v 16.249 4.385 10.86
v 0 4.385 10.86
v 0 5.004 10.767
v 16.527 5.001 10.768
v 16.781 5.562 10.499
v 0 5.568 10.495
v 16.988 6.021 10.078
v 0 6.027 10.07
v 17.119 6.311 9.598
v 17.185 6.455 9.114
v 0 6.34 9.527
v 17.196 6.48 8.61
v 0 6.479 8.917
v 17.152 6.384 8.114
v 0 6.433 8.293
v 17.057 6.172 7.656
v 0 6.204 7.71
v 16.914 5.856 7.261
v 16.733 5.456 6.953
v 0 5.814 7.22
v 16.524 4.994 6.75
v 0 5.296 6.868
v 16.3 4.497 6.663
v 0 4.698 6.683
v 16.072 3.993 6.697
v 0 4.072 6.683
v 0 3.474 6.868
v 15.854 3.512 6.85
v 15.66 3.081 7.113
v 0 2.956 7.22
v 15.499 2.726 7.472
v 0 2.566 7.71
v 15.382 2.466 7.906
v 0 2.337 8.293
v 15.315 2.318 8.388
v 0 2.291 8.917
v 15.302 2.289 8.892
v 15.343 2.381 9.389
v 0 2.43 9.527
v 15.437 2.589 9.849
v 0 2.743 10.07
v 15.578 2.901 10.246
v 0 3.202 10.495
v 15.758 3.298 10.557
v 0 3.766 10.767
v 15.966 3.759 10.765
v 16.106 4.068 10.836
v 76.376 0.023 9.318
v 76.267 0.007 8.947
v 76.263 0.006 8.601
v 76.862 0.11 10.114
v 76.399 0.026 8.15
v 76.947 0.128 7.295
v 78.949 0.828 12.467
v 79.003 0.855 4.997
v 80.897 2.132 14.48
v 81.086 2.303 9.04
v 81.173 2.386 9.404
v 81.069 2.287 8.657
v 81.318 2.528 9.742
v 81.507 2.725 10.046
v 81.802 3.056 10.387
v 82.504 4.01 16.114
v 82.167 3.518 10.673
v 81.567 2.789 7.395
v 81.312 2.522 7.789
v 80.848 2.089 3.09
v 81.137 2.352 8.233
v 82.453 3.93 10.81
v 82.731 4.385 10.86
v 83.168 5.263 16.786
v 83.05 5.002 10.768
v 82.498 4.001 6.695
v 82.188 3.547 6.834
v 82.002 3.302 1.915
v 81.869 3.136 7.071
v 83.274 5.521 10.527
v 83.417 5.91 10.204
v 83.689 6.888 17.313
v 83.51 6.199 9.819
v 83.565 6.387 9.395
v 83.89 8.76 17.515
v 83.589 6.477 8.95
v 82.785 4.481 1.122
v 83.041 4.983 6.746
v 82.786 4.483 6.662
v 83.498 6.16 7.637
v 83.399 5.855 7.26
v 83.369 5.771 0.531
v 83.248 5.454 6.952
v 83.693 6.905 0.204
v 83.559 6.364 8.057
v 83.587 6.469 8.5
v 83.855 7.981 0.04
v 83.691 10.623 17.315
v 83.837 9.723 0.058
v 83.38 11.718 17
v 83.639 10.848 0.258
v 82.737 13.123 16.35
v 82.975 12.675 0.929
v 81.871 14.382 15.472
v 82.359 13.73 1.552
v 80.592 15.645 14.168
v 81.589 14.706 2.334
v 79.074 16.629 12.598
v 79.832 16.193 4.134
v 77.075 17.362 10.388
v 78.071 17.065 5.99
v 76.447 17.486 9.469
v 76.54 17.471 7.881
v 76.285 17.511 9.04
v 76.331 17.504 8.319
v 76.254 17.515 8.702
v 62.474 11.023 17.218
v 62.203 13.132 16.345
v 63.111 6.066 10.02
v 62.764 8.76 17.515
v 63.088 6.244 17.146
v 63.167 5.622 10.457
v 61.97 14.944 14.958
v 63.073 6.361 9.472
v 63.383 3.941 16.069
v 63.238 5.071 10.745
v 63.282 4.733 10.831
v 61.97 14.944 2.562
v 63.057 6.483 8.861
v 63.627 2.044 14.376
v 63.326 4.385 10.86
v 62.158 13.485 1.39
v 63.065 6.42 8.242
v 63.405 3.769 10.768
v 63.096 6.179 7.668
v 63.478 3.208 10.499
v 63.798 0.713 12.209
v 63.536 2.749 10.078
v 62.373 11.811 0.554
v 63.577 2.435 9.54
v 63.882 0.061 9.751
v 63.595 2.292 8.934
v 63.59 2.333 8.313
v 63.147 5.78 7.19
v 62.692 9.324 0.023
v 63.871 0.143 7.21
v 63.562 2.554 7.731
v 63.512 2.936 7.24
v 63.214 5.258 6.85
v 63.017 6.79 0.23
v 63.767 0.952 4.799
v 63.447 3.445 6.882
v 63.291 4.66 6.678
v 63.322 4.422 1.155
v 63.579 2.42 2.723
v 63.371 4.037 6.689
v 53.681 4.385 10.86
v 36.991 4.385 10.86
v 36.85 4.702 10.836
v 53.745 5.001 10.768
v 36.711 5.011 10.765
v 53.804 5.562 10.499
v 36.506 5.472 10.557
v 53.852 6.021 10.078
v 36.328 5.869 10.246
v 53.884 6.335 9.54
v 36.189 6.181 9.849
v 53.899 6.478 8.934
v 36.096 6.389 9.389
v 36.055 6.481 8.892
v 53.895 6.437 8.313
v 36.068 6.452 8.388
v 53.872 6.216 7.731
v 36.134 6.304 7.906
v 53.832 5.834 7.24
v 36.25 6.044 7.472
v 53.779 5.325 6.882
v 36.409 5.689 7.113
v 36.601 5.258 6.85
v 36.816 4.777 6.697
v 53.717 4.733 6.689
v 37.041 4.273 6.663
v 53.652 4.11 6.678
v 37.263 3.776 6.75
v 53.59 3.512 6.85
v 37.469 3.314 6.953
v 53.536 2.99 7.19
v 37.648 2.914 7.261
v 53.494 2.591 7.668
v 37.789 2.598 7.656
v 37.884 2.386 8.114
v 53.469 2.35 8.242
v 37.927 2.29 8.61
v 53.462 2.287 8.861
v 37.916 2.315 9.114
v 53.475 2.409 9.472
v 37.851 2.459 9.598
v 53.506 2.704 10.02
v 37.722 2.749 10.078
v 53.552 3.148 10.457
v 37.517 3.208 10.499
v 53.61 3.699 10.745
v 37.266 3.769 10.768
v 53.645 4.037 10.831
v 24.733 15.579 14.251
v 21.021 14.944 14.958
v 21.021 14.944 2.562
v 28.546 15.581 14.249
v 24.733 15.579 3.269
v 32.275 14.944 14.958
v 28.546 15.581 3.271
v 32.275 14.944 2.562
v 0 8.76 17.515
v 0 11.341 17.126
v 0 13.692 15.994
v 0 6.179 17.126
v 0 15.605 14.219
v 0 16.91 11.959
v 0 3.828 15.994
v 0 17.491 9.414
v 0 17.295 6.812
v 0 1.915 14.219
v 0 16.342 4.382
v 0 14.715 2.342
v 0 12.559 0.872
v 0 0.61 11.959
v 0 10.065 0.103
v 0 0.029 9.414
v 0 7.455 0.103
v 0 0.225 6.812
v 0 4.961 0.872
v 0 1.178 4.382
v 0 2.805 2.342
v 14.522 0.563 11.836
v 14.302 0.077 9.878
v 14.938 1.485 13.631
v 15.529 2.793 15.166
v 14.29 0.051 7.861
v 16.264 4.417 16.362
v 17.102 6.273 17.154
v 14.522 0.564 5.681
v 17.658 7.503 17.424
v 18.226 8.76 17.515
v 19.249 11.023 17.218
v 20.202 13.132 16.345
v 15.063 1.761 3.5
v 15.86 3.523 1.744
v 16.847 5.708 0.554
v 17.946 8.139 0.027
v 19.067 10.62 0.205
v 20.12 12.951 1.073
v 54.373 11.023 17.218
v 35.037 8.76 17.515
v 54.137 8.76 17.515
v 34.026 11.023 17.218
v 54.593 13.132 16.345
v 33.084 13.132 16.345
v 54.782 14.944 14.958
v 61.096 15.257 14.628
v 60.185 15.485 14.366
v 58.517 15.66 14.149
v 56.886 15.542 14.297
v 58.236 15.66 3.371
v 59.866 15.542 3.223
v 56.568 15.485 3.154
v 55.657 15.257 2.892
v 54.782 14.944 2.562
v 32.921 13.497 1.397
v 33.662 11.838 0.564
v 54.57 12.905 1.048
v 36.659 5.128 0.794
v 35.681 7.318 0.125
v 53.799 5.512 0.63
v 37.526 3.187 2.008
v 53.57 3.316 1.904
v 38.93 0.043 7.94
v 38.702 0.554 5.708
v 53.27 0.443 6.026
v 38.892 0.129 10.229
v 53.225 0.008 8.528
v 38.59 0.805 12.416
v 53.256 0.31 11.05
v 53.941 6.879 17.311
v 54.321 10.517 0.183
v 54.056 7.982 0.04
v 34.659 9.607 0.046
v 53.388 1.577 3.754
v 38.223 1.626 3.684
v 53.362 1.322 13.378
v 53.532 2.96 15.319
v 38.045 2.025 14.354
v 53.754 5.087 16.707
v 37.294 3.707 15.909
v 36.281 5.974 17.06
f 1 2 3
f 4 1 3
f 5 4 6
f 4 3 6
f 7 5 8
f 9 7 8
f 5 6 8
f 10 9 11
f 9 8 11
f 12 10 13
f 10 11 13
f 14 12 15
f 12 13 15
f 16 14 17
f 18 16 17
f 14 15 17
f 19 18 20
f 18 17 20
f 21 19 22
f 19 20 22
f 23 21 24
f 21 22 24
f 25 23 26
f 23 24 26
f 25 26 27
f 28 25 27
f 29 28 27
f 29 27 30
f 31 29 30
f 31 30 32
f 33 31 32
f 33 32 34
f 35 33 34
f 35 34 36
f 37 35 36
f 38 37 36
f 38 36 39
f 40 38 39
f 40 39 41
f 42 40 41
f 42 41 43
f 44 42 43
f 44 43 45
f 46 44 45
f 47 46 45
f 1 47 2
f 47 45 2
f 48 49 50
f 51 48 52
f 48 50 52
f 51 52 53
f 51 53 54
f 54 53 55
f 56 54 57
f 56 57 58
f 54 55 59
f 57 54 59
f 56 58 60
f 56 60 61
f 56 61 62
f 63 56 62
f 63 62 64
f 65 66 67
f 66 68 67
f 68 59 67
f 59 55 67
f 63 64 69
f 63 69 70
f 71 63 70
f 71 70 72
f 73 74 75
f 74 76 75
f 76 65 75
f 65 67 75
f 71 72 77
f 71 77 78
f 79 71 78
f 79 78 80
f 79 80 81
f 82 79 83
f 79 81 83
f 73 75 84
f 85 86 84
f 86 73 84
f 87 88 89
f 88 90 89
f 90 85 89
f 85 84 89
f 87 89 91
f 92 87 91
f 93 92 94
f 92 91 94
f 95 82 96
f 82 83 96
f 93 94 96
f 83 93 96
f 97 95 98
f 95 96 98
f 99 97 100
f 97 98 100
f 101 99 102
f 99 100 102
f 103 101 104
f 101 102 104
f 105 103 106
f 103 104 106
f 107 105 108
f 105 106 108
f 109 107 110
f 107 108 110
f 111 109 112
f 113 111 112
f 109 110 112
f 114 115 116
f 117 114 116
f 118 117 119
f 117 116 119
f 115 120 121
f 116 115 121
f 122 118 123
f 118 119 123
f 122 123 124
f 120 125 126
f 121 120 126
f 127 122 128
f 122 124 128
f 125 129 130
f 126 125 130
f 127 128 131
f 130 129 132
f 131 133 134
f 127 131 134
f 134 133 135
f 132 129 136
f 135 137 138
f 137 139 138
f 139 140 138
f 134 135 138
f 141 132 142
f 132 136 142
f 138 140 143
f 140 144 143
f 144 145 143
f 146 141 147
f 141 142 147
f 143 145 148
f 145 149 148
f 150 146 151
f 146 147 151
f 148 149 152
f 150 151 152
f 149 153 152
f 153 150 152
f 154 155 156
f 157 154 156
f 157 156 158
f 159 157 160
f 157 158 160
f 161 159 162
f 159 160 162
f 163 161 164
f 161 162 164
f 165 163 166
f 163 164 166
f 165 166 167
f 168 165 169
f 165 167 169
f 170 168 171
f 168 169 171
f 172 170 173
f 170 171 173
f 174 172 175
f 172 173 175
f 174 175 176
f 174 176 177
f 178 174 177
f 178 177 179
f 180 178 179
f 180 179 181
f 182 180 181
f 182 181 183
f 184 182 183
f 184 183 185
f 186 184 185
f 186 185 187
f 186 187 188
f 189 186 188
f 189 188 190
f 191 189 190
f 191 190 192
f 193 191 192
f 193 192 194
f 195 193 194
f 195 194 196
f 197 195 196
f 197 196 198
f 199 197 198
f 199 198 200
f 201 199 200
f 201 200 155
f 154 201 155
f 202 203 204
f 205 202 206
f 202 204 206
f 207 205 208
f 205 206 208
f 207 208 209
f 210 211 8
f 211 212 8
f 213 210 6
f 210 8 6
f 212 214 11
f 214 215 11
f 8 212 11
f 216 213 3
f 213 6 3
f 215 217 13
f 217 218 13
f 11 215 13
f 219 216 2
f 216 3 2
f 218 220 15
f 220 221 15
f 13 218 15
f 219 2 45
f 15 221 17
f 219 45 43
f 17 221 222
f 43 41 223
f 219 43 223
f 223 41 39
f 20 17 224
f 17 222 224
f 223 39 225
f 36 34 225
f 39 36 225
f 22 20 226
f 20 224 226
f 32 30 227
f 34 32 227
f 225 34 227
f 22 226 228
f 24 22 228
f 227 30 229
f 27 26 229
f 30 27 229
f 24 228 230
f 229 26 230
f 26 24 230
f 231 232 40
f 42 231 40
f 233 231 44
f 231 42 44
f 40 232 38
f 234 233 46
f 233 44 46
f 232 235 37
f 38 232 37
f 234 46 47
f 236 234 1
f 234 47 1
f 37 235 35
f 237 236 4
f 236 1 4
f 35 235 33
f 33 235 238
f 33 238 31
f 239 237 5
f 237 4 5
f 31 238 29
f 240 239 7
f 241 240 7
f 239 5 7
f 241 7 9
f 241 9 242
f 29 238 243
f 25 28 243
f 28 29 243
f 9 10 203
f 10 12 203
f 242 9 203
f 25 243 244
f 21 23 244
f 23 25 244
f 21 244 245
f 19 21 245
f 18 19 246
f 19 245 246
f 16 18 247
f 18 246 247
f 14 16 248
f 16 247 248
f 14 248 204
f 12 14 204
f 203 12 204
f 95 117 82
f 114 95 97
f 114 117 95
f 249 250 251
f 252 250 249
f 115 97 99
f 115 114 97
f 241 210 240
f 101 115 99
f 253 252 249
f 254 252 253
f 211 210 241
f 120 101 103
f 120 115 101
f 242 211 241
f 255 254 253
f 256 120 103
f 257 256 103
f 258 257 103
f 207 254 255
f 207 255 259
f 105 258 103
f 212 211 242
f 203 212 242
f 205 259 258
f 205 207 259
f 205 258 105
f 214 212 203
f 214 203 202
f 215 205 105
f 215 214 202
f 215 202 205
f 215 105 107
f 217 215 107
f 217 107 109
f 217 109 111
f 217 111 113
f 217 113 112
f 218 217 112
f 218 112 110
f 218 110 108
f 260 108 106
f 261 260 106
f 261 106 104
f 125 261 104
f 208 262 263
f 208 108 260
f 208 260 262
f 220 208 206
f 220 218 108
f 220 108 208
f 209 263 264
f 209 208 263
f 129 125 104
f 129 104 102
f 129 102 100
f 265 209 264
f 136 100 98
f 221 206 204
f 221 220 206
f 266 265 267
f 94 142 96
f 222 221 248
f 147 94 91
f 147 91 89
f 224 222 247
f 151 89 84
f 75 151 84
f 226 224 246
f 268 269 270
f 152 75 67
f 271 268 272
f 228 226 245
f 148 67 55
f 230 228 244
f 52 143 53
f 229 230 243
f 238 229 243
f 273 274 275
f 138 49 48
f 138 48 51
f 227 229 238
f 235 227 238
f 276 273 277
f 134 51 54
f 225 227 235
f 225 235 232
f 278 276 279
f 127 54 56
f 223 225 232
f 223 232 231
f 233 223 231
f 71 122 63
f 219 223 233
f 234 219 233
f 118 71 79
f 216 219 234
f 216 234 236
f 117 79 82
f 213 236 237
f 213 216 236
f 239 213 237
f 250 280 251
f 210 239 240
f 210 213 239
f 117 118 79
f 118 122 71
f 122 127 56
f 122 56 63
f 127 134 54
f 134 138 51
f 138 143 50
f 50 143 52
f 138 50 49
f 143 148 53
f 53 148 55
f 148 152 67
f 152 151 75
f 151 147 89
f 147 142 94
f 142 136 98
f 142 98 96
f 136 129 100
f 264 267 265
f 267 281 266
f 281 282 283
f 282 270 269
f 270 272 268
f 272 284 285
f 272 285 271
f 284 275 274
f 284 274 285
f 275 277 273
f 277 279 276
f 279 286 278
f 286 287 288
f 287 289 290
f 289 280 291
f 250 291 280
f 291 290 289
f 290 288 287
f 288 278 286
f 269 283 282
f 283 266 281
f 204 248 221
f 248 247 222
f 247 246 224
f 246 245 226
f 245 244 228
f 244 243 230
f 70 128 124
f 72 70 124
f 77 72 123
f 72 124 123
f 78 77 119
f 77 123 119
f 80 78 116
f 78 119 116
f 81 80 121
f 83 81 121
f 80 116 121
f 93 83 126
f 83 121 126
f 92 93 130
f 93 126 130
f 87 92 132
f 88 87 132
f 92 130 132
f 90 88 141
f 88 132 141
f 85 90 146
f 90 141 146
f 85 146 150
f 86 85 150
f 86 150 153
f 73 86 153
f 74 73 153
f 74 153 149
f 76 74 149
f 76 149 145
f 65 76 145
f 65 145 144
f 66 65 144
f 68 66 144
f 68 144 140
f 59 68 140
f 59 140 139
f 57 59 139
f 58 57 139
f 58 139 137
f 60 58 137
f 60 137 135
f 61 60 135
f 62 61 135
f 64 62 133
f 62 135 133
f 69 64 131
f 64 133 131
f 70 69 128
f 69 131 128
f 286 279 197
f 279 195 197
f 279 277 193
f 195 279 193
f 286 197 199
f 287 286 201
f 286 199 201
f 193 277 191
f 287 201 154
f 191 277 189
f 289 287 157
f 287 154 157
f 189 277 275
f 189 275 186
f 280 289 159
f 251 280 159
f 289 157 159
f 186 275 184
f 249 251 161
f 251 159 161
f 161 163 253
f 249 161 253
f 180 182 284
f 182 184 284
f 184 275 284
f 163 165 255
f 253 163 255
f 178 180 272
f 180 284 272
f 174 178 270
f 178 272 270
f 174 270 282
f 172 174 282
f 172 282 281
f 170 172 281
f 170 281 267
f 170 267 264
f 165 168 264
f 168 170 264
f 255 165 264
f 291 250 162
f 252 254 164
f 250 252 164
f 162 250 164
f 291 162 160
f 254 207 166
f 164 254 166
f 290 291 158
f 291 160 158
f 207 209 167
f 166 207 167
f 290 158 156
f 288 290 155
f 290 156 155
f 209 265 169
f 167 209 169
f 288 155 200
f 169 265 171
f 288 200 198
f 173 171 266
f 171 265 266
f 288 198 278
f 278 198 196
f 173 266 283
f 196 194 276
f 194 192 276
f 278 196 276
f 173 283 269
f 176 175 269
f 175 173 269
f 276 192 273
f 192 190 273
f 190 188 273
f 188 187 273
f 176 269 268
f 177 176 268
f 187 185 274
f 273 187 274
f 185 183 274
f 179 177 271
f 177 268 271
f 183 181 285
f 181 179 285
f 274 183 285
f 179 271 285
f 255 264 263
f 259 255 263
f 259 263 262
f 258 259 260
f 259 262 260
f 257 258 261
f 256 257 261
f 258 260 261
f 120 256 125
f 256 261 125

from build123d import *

# Parameters (mm, degrees)
BOSS_EXTRUDE3_DEPTH = 17.52
SKETCH5_OUTSIDE_W   = 37.02
SKETCH5_OUTSIDE_H   = 37.174
SKETCH5_OUTSIDE_R   = 8.755
CUT_EXTRUDE7_DEPTH  = 88.487428942
SKETCH6_R           = 2.100334354
CUT_EXTRUDE8_DEPTH  = 88.46999549


with BuildPart() as part:
    # Sketch1 → Boss-Extrude3 (new body)
    with BuildSketch(Plane.XY):
        with BuildLine():
            Line((0, 0), (14.267245849, 0))
            Line((14.267245849, 0), (21.021041326, 14.94364804))
            ThreePointArc((21.021041326, 14.94364804), (26.648105385, 15.66096006), (32.275169445, 14.94364804))
            Line((32.275169445, 14.94364804), (38.949508505, 0))
            Line((38.949508505, 0), (53.219448236, -0.041473561))
            Line((53.219448236, -0.041473561), (54.782126974, 14.94364804))
            ThreePointArc((54.782126974, 14.94364804), (58.376232217, 15.66096006), (61.97033746, 14.94364804))
            Line((61.97033746, 14.94364804), (63.889508505, 0))
            Line((63.889508505, 0), (73.889508505, 0))
            ThreePointArc((73.889508505, 0), (83.889508505, 8.76), (73.889508505, 17.52))
            Line((73.889508505, 17.52), (0, 17.52))
            Line((0, 17.52), (0, 0))
        make_face()
    extrude(amount=BOSS_EXTRUDE3_DEPTH)

    # Sketch5 outside → Cut-Extrude7 (cut, through all)
    with BuildSketch(Plane.ZY):
        with Locations((8.76, 8.76)):
            Rectangle(SKETCH5_OUTSIDE_W, SKETCH5_OUTSIDE_H)
        with Locations((8.76, 8.76)):
            Circle(SKETCH5_OUTSIDE_R, mode=Mode.SUBTRACT)
    extrude(amount=-CUT_EXTRUDE7_DEPTH, mode=Mode.SUBTRACT)

    # Sketch6 → Cut-Extrude8 (cut, through all)
    with BuildSketch(Plane.ZY):
        with Locations((8.76, 4.385)):
            Circle(SKETCH6_R)
    extrude(amount=-CUT_EXTRUDE8_DEPTH, mode=Mode.SUBTRACT)


solid = part.part
